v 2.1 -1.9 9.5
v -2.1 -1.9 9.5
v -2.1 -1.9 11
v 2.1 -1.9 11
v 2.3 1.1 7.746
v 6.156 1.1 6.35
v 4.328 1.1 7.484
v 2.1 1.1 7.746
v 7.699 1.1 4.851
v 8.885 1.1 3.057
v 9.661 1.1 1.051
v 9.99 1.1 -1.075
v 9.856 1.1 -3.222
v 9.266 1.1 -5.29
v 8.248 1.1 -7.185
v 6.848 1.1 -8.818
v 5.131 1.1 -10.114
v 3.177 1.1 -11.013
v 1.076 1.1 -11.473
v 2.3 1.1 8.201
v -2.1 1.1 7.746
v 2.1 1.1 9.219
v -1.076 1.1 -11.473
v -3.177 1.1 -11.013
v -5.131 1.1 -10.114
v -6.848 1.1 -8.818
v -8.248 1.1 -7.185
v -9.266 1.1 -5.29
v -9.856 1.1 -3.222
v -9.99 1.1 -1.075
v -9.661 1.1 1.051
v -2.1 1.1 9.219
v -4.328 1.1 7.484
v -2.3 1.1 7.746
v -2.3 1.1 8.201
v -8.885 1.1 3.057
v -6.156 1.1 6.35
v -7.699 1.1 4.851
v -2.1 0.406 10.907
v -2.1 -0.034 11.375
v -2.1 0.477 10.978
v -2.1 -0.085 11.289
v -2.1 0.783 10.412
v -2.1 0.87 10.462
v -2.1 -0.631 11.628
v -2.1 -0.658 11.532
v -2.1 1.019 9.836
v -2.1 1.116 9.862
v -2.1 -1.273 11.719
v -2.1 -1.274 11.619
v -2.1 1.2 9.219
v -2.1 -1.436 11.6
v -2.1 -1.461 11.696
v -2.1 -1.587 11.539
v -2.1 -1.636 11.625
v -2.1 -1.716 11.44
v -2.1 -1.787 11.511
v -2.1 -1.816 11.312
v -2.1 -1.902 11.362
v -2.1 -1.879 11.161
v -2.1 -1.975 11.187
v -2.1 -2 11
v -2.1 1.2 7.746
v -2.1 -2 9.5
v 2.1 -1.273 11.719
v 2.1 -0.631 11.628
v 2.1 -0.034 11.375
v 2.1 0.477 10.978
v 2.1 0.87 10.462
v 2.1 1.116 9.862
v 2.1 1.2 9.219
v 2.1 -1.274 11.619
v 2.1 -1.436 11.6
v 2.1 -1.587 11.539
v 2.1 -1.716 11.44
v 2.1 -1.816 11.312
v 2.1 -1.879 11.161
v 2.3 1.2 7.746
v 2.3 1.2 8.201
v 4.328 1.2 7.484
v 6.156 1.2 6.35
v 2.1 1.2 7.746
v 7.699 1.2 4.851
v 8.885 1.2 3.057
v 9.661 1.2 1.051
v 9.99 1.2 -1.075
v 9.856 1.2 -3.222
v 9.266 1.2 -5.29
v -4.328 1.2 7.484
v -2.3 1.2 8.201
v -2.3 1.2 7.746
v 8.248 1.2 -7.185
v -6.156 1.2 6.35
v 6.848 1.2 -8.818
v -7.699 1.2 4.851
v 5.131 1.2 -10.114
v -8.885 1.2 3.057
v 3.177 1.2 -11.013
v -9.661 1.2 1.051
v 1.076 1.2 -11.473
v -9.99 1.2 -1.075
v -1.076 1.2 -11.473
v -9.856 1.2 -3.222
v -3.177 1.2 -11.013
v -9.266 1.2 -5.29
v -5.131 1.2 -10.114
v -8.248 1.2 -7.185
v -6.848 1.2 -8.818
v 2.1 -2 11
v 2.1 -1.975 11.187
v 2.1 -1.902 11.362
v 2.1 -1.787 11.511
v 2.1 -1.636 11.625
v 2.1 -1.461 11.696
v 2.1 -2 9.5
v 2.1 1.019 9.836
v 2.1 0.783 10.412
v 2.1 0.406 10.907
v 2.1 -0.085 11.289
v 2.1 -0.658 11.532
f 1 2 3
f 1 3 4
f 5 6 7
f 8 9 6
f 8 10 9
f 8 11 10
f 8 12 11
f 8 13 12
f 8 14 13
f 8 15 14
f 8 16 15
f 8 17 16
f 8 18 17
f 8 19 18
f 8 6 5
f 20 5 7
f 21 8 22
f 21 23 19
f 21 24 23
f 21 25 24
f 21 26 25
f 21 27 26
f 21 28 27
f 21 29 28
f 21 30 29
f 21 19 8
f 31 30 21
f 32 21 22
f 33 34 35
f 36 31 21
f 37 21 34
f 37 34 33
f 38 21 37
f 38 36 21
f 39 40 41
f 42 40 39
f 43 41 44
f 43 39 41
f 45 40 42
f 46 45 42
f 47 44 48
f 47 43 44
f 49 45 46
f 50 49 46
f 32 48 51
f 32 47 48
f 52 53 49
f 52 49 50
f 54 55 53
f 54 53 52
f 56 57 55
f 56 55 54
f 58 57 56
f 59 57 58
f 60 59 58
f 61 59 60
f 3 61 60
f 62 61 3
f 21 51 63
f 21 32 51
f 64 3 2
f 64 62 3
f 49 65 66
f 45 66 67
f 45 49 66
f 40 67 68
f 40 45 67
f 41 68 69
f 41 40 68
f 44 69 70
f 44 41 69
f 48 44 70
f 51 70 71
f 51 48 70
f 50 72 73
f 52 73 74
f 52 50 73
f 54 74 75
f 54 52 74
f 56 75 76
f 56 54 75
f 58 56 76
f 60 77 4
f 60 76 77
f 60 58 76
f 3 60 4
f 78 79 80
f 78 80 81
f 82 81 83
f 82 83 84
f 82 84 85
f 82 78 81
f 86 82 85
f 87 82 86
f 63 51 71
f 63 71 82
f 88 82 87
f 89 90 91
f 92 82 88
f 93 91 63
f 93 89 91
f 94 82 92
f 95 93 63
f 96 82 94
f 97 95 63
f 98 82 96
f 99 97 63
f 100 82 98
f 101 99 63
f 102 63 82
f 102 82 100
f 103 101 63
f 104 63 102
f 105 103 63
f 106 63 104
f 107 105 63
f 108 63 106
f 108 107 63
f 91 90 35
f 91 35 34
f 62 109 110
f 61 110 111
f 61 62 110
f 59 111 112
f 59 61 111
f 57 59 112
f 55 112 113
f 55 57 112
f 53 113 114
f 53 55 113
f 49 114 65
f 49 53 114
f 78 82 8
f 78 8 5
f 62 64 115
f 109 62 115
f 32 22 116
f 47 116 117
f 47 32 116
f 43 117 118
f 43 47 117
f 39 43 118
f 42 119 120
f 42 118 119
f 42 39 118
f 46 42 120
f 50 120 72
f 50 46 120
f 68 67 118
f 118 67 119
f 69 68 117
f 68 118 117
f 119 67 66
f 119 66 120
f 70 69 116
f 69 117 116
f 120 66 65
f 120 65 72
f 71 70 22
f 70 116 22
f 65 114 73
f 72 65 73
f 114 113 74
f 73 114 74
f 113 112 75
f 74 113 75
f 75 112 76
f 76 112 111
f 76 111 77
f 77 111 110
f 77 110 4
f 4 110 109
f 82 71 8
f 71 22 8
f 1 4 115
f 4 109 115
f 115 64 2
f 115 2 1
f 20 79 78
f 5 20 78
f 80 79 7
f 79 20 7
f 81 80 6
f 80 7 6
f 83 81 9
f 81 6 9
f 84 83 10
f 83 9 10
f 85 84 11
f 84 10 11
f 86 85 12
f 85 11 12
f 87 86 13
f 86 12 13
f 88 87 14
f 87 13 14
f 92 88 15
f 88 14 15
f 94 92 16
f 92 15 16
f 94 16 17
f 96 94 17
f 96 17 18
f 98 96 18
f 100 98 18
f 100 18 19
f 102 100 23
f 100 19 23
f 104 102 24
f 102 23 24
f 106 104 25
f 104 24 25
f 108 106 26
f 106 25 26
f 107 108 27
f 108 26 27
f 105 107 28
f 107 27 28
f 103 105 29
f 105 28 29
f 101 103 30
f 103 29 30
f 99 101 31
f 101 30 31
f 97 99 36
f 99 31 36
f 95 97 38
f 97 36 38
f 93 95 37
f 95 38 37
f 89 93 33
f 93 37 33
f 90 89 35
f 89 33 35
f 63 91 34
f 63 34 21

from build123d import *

# Parameters (mm, degrees)
SKETCH1_R                       = 10
BOSS_EXTRUDE1_DEPTH             = 0.1
BOSS_EXTRUDE2_START             = -2
SKETCH3_W                       = 4.2
SKETCH3_H                       = 1
BOSS_EXTRUDE2_DEPTH             = 0.1
EXTRUDE_THIN1_REACH             = 17.393
EXTRUDE_THIN1_DIRECTION_2_REACH = 17.393
SKETCH5_W                       = 0.2
SKETCH5_H                       = 0.5
CUT_EXTRUDE1_DEPTH              = 0.1


with BuildPart() as part:
    # Sketch1 → Boss-Extrude1 (new body)
    with BuildSketch(Plane(origin=(0, 1.1, 0), x_dir=(1, 0, 0), z_dir=(0, 1, 0))):
        with Locations(Location((0, 1.53064501, 0), (0, 0, 270))):
            Circle(SKETCH1_R)
    extrude(amount=BOSS_EXTRUDE1_DEPTH)


with BuildPart() as body_2:
    # Sketch3 → Boss-Extrude2 (new body)
    with BuildSketch(Plane(origin=(0, 0, 0), x_dir=(1, 0, 0), z_dir=(0, 1, 0)).offset(BOSS_EXTRUDE2_START)):
        with Locations((0, -10)):
            Rectangle(SKETCH3_W, SKETCH3_H)
    extrude(amount=BOSS_EXTRUDE2_DEPTH)

    # Extrude-Thin1: up to this face of the body (flat: up to its plane)
    extrude_thin1_end = Plane(body_2.part.faces().sort_by_distance((2.1, -1.95, 10))[0])
    # Sketch4 → Extrude-Thin1 (add, up to the picked face)
    with BuildSketch(Plane(origin=(0, 0, 0), x_dir=(0, 0, -1), z_dir=(1, 0, 0)), mode=Mode.PRIVATE) as extrude_thin1_sk1:
        with BuildLine():
            Line((-9.5, -2), (-10.5, -2))
            Line((-10.5, -2), (-11, -2))
            ThreePointArc((-11, -2), (-11.511328882, -1.786579748), (-11.7192089, -1.27297355))
            ThreePointArc((-11.7192089, -1.27297355), (-10.977540685, 0.47729656), (-9.21935499, 1.2))
            Line((-9.21935499, 1.2), (-8.46935499, 1.2))
            Line((-8.46935499, 1.2), (-5, 1.2))
            Line((-5, 1.2), (-5, 1.1))
            Line((-5, 1.1), (-8.46935499, 1.1))
            Line((-8.46935499, 1.1), (-9.21935499, 1.1))
            ThreePointArc((-9.21935499, 1.1), (-10.907213257, 0.406204698), (-11.619214744, -1.274054608))
            ThreePointArc((-11.619214744, -1.274054608), (-11.440237019, -1.716252321), (-11, -1.9))
            Line((-11, -1.9), (-10.5, -1.9))
            Line((-10.5, -1.9), (-9.5, -1.9))
            Line((-9.5, -1.9), (-9.5, -2))
        make_face()
    extrude_thin1_tool1 = split(extrude(extrude_thin1_sk1.sketch, amount=EXTRUDE_THIN1_REACH, mode=Mode.PRIVATE), bisect_by=extrude_thin1_end, keep=Keep.BOTH, mode=Mode.PRIVATE)

    add(part.part)  # Extrude-Thin1 merges part
    add(extrude_thin1_tool1.solids().sort_by(Axis((0, -1.974423, 10.75), (1, 0, 0)))[0])

    # Extrude-Thin1 direction 2: up to this face of the body (flat: up to its plane)
    extrude_thin1_direction_2_end = Plane(body_2.part.faces().sort_by_distance((-2.1, -1.95, 10))[0])
    # Sketch4 → Extrude-Thin1 direction 2 (add, up to the picked face)
    with BuildSketch(Plane(origin=(0, 0, 0), x_dir=(0, 0, -1), z_dir=(1, 0, 0)), mode=Mode.PRIVATE) as extrude_thin1_direction_2_sk1:
        with BuildLine():
            Line((-9.5, -2), (-10.5, -2))
            Line((-10.5, -2), (-11, -2))
            ThreePointArc((-11, -2), (-11.511328882, -1.786579748), (-11.7192089, -1.27297355))
            ThreePointArc((-11.7192089, -1.27297355), (-10.977540685, 0.47729656), (-9.21935499, 1.2))
            Line((-9.21935499, 1.2), (-8.46935499, 1.2))
            Line((-8.46935499, 1.2), (-5, 1.2))
            Line((-5, 1.2), (-5, 1.1))
            Line((-5, 1.1), (-8.46935499, 1.1))
            Line((-8.46935499, 1.1), (-9.21935499, 1.1))
            ThreePointArc((-9.21935499, 1.1), (-10.907213257, 0.406204698), (-11.619214744, -1.274054608))
            ThreePointArc((-11.619214744, -1.274054608), (-11.440237019, -1.716252321), (-11, -1.9))
            Line((-11, -1.9), (-10.5, -1.9))
            Line((-10.5, -1.9), (-9.5, -1.9))
            Line((-9.5, -1.9), (-9.5, -2))
        make_face()
    extrude_thin1_direction_2_tool1 = split(extrude(extrude_thin1_direction_2_sk1.sketch, amount=-EXTRUDE_THIN1_DIRECTION_2_REACH, mode=Mode.PRIVATE), bisect_by=extrude_thin1_direction_2_end, keep=Keep.BOTH, mode=Mode.PRIVATE)
    add(extrude_thin1_direction_2_tool1.solids().sort_by(Axis((0, -1.974423, 10.75), (-1, 0, 0)))[0])

    # Sketch5 → Cut-Extrude1 (cut)
    with BuildSketch(Plane(origin=(0, 1.2, 0), x_dir=(1, 0, 0), z_dir=(0, 1, 0))):
        with Locations((-2.2, -7.996368849)):
            Rectangle(SKETCH5_W, SKETCH5_H)
        with Locations((2.2, -7.996368849)):
            Rectangle(SKETCH5_W, SKETCH5_H)
    extrude(amount=-CUT_EXTRUDE1_DEPTH, mode=Mode.SUBTRACT)


solid = body_2.part
